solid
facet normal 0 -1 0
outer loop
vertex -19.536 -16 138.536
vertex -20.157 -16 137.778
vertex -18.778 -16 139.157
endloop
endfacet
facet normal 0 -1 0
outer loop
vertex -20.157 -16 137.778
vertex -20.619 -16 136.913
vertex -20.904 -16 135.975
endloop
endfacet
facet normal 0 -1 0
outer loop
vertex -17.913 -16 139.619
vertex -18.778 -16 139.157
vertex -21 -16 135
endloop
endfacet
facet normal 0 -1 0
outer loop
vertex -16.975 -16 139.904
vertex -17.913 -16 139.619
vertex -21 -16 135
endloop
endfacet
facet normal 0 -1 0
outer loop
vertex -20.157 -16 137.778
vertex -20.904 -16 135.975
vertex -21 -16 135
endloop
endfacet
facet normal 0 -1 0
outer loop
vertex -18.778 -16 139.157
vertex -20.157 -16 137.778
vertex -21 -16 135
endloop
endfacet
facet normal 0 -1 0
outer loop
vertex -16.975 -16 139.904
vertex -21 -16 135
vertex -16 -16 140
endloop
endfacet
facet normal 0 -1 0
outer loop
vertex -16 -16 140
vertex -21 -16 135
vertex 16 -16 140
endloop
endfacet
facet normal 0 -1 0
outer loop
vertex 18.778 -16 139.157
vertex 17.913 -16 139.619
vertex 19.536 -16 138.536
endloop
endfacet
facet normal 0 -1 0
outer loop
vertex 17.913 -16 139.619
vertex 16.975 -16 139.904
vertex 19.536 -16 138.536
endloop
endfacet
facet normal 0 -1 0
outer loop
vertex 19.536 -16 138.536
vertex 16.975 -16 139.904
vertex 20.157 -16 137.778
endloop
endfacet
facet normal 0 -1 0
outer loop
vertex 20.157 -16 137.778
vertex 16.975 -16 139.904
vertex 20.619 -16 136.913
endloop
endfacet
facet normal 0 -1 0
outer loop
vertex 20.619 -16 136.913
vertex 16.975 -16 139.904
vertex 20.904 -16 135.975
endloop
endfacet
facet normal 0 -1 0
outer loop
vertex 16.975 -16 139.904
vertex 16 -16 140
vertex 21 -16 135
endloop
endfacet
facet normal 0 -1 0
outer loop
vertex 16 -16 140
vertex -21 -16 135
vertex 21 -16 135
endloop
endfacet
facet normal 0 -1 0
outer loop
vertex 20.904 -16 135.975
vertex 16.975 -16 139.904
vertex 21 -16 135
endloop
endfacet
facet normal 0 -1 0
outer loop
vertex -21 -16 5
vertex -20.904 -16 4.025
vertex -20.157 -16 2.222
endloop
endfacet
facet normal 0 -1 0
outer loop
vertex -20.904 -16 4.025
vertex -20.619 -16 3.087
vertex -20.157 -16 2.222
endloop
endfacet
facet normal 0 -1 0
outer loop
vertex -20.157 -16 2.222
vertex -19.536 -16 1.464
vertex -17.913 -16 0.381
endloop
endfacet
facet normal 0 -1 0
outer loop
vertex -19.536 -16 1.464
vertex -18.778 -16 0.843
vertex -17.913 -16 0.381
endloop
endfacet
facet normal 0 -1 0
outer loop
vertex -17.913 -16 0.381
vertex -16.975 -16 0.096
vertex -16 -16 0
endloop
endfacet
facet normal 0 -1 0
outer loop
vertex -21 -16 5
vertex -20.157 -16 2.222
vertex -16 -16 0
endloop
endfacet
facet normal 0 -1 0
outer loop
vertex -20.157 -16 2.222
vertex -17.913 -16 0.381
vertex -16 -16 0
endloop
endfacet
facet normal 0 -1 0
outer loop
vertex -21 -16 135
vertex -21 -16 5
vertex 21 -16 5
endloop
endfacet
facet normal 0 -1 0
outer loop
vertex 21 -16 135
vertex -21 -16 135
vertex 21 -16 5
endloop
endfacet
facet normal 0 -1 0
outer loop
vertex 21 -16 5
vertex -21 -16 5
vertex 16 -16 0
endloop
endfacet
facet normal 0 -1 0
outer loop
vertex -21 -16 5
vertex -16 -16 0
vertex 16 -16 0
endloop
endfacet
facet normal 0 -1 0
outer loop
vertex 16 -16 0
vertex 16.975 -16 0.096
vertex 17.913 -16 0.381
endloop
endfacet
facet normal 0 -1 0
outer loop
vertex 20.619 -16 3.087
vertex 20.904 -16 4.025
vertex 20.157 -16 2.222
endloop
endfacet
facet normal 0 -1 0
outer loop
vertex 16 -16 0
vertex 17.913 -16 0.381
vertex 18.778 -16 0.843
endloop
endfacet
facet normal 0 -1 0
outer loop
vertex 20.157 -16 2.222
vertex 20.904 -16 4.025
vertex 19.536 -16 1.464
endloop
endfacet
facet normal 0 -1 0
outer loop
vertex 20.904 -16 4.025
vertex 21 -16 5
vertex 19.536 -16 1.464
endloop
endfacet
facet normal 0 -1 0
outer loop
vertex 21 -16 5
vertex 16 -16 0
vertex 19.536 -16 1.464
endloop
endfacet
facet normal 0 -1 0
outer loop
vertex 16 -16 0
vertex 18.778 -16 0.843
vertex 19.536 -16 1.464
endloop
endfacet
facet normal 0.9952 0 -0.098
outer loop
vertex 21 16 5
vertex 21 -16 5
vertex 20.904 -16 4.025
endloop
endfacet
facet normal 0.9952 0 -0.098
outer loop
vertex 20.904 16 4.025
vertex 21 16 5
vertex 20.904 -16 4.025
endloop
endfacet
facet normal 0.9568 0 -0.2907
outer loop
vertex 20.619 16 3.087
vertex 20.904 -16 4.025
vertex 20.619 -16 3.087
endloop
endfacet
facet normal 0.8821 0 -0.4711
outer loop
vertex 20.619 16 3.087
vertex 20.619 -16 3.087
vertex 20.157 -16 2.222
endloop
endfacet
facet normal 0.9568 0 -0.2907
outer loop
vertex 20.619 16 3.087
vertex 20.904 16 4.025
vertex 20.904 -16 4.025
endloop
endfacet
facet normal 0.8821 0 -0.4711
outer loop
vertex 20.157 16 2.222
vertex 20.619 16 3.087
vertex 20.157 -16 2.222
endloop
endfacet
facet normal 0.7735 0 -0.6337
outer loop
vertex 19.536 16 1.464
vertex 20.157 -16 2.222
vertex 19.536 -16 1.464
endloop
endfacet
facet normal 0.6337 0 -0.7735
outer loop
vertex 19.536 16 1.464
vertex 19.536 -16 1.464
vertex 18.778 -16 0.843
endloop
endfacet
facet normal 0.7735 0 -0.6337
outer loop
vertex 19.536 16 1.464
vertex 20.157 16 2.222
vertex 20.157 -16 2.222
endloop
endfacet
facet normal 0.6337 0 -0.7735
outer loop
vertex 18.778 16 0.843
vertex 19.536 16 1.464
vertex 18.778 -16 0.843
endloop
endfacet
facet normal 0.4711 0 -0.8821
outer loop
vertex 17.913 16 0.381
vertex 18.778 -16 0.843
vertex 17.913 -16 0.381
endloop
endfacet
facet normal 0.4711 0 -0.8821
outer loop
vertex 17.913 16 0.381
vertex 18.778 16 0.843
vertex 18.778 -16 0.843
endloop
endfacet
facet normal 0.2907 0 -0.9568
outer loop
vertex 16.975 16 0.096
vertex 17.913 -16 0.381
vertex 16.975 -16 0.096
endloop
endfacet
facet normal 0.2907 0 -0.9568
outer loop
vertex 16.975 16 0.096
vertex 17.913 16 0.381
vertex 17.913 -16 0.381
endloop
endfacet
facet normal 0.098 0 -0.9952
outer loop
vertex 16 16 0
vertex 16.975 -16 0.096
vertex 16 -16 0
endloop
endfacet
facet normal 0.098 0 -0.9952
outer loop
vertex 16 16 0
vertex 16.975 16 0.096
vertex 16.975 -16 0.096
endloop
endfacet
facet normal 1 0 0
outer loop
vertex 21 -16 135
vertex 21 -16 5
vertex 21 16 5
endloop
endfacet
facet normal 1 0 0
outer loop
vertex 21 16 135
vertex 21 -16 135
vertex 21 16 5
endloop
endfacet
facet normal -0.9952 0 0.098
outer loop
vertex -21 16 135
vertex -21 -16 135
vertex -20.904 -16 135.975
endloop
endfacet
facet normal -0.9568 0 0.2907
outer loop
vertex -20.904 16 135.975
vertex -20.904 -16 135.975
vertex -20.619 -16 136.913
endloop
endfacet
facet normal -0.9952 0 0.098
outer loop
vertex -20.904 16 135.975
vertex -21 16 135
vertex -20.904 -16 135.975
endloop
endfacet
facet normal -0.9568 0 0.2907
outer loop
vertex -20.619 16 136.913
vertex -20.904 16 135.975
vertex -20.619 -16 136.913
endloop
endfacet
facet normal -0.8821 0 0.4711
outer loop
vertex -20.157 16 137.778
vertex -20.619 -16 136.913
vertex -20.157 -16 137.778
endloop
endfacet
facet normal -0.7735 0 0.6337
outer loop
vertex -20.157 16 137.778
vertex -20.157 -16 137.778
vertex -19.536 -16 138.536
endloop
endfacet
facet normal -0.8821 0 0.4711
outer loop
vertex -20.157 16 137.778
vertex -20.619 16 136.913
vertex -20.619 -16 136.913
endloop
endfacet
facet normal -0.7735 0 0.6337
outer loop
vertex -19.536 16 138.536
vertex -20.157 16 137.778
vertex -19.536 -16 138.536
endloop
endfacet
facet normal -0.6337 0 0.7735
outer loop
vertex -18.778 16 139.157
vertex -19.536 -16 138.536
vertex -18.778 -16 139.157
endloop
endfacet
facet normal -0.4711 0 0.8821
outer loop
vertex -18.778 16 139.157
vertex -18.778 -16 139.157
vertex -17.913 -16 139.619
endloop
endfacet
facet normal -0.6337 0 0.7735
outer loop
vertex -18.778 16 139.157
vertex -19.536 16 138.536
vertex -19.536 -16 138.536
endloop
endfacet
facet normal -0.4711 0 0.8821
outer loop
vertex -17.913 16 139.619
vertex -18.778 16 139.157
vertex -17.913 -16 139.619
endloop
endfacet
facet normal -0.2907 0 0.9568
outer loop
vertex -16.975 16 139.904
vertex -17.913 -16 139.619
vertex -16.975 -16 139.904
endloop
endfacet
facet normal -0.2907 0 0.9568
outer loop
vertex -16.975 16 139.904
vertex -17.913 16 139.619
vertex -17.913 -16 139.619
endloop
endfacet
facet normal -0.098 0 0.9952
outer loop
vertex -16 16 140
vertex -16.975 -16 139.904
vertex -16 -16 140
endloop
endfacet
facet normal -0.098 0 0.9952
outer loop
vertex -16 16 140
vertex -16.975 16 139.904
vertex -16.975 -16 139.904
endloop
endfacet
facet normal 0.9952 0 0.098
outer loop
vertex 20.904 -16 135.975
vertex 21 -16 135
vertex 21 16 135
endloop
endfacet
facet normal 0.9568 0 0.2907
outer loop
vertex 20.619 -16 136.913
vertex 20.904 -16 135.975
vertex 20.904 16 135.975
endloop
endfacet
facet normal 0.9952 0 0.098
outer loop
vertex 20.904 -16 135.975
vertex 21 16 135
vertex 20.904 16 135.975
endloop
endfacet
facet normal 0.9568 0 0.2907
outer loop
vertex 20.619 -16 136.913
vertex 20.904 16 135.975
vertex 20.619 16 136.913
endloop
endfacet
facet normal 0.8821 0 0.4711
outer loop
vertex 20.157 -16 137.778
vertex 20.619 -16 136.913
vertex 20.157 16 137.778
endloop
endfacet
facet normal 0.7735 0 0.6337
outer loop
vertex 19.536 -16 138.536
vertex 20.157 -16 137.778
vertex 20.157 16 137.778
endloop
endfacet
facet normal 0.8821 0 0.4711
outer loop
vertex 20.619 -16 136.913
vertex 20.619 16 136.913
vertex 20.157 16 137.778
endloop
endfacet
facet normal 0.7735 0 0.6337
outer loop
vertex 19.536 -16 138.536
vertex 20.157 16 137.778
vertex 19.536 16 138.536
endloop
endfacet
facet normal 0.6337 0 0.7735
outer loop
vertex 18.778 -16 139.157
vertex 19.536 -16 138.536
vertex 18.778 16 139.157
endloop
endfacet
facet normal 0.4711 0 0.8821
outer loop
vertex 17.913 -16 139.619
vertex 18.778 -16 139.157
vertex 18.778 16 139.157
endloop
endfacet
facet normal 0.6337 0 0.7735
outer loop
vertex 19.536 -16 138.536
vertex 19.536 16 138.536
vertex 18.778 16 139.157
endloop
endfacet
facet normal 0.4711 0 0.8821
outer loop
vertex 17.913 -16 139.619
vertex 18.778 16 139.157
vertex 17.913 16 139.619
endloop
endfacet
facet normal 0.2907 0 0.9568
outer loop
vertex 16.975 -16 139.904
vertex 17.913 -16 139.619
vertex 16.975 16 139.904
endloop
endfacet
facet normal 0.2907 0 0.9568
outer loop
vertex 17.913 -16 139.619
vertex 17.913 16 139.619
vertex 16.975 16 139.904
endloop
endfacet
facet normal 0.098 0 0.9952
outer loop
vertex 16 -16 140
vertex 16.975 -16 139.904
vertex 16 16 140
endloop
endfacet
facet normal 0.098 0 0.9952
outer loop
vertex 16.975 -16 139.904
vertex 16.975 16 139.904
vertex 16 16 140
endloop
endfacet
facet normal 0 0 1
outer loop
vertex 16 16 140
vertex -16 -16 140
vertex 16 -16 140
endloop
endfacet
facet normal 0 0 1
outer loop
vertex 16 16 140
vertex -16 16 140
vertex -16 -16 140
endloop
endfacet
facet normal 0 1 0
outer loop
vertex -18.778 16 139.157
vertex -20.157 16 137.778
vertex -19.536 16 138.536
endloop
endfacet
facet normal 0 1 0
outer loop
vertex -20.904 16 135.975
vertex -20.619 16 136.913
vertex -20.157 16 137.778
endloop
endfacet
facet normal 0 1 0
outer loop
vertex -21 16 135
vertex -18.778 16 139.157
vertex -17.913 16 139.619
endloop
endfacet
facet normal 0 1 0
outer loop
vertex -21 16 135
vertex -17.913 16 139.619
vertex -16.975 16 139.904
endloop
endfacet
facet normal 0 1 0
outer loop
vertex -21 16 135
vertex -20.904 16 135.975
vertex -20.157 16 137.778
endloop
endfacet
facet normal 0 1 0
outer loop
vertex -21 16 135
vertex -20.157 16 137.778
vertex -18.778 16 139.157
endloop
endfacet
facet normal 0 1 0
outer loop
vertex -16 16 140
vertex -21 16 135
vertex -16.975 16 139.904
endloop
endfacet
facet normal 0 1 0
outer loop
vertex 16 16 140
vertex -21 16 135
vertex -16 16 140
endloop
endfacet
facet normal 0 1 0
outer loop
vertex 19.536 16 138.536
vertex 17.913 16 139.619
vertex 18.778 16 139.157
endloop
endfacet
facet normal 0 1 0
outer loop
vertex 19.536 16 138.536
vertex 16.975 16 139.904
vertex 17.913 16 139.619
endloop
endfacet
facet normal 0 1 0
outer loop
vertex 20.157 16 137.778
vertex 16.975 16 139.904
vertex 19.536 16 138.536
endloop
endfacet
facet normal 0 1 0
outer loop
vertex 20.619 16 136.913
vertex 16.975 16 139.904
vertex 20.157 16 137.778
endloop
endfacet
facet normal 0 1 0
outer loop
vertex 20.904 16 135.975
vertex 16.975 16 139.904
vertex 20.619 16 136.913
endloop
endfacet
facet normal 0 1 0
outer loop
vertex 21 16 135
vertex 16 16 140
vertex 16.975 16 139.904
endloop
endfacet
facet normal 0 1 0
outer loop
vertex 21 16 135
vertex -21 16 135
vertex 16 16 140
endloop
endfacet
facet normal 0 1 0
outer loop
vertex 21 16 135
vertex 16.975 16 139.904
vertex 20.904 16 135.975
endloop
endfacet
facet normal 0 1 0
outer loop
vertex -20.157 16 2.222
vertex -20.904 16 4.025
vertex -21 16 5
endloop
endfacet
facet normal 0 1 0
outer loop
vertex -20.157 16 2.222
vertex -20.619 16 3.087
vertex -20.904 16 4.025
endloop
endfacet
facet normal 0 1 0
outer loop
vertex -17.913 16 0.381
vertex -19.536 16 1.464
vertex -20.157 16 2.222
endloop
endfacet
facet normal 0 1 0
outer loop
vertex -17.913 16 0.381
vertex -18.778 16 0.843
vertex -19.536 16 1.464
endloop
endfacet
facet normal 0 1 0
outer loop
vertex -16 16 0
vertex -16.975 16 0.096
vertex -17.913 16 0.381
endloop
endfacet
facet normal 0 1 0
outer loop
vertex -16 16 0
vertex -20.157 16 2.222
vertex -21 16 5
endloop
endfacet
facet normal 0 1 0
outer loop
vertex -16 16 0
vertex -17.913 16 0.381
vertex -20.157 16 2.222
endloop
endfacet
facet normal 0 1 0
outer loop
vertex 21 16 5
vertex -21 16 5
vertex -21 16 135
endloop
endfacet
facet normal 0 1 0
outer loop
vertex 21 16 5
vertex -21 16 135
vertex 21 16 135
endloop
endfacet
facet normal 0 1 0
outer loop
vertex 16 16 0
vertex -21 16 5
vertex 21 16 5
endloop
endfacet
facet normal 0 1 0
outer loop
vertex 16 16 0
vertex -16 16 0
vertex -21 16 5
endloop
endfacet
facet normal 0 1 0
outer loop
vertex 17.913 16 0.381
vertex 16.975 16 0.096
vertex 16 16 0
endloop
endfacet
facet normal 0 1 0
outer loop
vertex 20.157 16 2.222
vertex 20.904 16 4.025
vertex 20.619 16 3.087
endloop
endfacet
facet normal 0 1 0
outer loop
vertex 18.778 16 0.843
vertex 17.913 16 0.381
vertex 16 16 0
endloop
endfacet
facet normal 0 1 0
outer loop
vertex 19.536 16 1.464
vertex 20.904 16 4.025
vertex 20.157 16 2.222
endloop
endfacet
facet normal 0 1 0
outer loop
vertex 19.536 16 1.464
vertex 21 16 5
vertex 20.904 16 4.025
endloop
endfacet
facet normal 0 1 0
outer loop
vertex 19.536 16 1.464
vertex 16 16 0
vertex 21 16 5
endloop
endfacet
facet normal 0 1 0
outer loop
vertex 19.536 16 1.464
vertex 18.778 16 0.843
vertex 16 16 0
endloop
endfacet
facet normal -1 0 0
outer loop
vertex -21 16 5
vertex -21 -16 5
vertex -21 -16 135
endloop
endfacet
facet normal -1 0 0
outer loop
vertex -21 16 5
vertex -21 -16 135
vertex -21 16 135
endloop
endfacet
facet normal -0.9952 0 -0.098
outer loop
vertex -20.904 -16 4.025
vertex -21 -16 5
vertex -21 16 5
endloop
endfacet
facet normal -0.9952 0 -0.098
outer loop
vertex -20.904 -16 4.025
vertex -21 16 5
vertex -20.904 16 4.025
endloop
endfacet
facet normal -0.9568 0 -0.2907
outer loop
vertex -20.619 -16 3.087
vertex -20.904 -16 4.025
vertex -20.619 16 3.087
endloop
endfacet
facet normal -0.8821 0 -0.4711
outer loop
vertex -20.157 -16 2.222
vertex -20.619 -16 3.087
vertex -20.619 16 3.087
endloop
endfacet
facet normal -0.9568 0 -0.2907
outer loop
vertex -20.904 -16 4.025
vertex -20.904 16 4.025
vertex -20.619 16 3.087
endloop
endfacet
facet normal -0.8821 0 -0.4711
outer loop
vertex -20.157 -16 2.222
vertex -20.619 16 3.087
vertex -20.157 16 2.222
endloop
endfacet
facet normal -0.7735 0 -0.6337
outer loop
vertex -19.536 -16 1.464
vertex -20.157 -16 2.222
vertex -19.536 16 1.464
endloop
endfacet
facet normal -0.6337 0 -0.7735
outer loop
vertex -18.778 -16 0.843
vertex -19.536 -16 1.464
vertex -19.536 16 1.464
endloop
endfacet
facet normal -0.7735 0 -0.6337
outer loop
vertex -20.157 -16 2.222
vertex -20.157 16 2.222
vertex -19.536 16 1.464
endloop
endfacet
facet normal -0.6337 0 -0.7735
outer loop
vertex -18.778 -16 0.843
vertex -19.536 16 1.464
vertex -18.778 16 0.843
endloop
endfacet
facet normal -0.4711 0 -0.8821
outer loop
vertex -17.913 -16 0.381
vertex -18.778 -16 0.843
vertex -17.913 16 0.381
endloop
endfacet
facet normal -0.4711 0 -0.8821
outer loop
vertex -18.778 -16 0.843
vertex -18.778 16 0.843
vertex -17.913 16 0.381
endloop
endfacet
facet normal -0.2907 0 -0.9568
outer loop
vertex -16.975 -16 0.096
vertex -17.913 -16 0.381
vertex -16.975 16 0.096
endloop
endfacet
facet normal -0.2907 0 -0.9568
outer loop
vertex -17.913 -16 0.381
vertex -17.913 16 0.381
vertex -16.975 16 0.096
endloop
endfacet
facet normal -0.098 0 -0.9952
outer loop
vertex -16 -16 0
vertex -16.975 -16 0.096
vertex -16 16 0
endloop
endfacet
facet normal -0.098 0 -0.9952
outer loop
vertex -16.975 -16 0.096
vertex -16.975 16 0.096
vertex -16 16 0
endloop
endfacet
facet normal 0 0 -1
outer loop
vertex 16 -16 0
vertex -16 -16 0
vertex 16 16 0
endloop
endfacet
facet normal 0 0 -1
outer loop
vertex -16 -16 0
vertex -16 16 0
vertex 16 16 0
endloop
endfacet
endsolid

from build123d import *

# Parameters (mm, degrees)
IZIM1_W                     = 42
IZIM1_H                     = 32
Y_KSEKLIK_EKSTR_ZYON1_DEPTH = 140
RADYUS1_R                   = 5


with BuildPart() as part:
    # Çizim1 → Yükseklik-Ekstrüzyon1 (new body)
    with BuildSketch(Plane.XY):
        Rectangle(IZIM1_W, IZIM1_H)
    extrude(amount=Y_KSEKLIK_EKSTR_ZYON1_DEPTH)

    # Radyus1
    radyus1_edges = [part.edges().sort_by_distance(p)[0] for p in [
        (-21, 0, 140),
        (21, 0, 140),
        (-21, 0, 0),
        (21, 0, 0),
    ]]
    fillet(radyus1_edges, radius=RADYUS1_R)


solid = part.part
